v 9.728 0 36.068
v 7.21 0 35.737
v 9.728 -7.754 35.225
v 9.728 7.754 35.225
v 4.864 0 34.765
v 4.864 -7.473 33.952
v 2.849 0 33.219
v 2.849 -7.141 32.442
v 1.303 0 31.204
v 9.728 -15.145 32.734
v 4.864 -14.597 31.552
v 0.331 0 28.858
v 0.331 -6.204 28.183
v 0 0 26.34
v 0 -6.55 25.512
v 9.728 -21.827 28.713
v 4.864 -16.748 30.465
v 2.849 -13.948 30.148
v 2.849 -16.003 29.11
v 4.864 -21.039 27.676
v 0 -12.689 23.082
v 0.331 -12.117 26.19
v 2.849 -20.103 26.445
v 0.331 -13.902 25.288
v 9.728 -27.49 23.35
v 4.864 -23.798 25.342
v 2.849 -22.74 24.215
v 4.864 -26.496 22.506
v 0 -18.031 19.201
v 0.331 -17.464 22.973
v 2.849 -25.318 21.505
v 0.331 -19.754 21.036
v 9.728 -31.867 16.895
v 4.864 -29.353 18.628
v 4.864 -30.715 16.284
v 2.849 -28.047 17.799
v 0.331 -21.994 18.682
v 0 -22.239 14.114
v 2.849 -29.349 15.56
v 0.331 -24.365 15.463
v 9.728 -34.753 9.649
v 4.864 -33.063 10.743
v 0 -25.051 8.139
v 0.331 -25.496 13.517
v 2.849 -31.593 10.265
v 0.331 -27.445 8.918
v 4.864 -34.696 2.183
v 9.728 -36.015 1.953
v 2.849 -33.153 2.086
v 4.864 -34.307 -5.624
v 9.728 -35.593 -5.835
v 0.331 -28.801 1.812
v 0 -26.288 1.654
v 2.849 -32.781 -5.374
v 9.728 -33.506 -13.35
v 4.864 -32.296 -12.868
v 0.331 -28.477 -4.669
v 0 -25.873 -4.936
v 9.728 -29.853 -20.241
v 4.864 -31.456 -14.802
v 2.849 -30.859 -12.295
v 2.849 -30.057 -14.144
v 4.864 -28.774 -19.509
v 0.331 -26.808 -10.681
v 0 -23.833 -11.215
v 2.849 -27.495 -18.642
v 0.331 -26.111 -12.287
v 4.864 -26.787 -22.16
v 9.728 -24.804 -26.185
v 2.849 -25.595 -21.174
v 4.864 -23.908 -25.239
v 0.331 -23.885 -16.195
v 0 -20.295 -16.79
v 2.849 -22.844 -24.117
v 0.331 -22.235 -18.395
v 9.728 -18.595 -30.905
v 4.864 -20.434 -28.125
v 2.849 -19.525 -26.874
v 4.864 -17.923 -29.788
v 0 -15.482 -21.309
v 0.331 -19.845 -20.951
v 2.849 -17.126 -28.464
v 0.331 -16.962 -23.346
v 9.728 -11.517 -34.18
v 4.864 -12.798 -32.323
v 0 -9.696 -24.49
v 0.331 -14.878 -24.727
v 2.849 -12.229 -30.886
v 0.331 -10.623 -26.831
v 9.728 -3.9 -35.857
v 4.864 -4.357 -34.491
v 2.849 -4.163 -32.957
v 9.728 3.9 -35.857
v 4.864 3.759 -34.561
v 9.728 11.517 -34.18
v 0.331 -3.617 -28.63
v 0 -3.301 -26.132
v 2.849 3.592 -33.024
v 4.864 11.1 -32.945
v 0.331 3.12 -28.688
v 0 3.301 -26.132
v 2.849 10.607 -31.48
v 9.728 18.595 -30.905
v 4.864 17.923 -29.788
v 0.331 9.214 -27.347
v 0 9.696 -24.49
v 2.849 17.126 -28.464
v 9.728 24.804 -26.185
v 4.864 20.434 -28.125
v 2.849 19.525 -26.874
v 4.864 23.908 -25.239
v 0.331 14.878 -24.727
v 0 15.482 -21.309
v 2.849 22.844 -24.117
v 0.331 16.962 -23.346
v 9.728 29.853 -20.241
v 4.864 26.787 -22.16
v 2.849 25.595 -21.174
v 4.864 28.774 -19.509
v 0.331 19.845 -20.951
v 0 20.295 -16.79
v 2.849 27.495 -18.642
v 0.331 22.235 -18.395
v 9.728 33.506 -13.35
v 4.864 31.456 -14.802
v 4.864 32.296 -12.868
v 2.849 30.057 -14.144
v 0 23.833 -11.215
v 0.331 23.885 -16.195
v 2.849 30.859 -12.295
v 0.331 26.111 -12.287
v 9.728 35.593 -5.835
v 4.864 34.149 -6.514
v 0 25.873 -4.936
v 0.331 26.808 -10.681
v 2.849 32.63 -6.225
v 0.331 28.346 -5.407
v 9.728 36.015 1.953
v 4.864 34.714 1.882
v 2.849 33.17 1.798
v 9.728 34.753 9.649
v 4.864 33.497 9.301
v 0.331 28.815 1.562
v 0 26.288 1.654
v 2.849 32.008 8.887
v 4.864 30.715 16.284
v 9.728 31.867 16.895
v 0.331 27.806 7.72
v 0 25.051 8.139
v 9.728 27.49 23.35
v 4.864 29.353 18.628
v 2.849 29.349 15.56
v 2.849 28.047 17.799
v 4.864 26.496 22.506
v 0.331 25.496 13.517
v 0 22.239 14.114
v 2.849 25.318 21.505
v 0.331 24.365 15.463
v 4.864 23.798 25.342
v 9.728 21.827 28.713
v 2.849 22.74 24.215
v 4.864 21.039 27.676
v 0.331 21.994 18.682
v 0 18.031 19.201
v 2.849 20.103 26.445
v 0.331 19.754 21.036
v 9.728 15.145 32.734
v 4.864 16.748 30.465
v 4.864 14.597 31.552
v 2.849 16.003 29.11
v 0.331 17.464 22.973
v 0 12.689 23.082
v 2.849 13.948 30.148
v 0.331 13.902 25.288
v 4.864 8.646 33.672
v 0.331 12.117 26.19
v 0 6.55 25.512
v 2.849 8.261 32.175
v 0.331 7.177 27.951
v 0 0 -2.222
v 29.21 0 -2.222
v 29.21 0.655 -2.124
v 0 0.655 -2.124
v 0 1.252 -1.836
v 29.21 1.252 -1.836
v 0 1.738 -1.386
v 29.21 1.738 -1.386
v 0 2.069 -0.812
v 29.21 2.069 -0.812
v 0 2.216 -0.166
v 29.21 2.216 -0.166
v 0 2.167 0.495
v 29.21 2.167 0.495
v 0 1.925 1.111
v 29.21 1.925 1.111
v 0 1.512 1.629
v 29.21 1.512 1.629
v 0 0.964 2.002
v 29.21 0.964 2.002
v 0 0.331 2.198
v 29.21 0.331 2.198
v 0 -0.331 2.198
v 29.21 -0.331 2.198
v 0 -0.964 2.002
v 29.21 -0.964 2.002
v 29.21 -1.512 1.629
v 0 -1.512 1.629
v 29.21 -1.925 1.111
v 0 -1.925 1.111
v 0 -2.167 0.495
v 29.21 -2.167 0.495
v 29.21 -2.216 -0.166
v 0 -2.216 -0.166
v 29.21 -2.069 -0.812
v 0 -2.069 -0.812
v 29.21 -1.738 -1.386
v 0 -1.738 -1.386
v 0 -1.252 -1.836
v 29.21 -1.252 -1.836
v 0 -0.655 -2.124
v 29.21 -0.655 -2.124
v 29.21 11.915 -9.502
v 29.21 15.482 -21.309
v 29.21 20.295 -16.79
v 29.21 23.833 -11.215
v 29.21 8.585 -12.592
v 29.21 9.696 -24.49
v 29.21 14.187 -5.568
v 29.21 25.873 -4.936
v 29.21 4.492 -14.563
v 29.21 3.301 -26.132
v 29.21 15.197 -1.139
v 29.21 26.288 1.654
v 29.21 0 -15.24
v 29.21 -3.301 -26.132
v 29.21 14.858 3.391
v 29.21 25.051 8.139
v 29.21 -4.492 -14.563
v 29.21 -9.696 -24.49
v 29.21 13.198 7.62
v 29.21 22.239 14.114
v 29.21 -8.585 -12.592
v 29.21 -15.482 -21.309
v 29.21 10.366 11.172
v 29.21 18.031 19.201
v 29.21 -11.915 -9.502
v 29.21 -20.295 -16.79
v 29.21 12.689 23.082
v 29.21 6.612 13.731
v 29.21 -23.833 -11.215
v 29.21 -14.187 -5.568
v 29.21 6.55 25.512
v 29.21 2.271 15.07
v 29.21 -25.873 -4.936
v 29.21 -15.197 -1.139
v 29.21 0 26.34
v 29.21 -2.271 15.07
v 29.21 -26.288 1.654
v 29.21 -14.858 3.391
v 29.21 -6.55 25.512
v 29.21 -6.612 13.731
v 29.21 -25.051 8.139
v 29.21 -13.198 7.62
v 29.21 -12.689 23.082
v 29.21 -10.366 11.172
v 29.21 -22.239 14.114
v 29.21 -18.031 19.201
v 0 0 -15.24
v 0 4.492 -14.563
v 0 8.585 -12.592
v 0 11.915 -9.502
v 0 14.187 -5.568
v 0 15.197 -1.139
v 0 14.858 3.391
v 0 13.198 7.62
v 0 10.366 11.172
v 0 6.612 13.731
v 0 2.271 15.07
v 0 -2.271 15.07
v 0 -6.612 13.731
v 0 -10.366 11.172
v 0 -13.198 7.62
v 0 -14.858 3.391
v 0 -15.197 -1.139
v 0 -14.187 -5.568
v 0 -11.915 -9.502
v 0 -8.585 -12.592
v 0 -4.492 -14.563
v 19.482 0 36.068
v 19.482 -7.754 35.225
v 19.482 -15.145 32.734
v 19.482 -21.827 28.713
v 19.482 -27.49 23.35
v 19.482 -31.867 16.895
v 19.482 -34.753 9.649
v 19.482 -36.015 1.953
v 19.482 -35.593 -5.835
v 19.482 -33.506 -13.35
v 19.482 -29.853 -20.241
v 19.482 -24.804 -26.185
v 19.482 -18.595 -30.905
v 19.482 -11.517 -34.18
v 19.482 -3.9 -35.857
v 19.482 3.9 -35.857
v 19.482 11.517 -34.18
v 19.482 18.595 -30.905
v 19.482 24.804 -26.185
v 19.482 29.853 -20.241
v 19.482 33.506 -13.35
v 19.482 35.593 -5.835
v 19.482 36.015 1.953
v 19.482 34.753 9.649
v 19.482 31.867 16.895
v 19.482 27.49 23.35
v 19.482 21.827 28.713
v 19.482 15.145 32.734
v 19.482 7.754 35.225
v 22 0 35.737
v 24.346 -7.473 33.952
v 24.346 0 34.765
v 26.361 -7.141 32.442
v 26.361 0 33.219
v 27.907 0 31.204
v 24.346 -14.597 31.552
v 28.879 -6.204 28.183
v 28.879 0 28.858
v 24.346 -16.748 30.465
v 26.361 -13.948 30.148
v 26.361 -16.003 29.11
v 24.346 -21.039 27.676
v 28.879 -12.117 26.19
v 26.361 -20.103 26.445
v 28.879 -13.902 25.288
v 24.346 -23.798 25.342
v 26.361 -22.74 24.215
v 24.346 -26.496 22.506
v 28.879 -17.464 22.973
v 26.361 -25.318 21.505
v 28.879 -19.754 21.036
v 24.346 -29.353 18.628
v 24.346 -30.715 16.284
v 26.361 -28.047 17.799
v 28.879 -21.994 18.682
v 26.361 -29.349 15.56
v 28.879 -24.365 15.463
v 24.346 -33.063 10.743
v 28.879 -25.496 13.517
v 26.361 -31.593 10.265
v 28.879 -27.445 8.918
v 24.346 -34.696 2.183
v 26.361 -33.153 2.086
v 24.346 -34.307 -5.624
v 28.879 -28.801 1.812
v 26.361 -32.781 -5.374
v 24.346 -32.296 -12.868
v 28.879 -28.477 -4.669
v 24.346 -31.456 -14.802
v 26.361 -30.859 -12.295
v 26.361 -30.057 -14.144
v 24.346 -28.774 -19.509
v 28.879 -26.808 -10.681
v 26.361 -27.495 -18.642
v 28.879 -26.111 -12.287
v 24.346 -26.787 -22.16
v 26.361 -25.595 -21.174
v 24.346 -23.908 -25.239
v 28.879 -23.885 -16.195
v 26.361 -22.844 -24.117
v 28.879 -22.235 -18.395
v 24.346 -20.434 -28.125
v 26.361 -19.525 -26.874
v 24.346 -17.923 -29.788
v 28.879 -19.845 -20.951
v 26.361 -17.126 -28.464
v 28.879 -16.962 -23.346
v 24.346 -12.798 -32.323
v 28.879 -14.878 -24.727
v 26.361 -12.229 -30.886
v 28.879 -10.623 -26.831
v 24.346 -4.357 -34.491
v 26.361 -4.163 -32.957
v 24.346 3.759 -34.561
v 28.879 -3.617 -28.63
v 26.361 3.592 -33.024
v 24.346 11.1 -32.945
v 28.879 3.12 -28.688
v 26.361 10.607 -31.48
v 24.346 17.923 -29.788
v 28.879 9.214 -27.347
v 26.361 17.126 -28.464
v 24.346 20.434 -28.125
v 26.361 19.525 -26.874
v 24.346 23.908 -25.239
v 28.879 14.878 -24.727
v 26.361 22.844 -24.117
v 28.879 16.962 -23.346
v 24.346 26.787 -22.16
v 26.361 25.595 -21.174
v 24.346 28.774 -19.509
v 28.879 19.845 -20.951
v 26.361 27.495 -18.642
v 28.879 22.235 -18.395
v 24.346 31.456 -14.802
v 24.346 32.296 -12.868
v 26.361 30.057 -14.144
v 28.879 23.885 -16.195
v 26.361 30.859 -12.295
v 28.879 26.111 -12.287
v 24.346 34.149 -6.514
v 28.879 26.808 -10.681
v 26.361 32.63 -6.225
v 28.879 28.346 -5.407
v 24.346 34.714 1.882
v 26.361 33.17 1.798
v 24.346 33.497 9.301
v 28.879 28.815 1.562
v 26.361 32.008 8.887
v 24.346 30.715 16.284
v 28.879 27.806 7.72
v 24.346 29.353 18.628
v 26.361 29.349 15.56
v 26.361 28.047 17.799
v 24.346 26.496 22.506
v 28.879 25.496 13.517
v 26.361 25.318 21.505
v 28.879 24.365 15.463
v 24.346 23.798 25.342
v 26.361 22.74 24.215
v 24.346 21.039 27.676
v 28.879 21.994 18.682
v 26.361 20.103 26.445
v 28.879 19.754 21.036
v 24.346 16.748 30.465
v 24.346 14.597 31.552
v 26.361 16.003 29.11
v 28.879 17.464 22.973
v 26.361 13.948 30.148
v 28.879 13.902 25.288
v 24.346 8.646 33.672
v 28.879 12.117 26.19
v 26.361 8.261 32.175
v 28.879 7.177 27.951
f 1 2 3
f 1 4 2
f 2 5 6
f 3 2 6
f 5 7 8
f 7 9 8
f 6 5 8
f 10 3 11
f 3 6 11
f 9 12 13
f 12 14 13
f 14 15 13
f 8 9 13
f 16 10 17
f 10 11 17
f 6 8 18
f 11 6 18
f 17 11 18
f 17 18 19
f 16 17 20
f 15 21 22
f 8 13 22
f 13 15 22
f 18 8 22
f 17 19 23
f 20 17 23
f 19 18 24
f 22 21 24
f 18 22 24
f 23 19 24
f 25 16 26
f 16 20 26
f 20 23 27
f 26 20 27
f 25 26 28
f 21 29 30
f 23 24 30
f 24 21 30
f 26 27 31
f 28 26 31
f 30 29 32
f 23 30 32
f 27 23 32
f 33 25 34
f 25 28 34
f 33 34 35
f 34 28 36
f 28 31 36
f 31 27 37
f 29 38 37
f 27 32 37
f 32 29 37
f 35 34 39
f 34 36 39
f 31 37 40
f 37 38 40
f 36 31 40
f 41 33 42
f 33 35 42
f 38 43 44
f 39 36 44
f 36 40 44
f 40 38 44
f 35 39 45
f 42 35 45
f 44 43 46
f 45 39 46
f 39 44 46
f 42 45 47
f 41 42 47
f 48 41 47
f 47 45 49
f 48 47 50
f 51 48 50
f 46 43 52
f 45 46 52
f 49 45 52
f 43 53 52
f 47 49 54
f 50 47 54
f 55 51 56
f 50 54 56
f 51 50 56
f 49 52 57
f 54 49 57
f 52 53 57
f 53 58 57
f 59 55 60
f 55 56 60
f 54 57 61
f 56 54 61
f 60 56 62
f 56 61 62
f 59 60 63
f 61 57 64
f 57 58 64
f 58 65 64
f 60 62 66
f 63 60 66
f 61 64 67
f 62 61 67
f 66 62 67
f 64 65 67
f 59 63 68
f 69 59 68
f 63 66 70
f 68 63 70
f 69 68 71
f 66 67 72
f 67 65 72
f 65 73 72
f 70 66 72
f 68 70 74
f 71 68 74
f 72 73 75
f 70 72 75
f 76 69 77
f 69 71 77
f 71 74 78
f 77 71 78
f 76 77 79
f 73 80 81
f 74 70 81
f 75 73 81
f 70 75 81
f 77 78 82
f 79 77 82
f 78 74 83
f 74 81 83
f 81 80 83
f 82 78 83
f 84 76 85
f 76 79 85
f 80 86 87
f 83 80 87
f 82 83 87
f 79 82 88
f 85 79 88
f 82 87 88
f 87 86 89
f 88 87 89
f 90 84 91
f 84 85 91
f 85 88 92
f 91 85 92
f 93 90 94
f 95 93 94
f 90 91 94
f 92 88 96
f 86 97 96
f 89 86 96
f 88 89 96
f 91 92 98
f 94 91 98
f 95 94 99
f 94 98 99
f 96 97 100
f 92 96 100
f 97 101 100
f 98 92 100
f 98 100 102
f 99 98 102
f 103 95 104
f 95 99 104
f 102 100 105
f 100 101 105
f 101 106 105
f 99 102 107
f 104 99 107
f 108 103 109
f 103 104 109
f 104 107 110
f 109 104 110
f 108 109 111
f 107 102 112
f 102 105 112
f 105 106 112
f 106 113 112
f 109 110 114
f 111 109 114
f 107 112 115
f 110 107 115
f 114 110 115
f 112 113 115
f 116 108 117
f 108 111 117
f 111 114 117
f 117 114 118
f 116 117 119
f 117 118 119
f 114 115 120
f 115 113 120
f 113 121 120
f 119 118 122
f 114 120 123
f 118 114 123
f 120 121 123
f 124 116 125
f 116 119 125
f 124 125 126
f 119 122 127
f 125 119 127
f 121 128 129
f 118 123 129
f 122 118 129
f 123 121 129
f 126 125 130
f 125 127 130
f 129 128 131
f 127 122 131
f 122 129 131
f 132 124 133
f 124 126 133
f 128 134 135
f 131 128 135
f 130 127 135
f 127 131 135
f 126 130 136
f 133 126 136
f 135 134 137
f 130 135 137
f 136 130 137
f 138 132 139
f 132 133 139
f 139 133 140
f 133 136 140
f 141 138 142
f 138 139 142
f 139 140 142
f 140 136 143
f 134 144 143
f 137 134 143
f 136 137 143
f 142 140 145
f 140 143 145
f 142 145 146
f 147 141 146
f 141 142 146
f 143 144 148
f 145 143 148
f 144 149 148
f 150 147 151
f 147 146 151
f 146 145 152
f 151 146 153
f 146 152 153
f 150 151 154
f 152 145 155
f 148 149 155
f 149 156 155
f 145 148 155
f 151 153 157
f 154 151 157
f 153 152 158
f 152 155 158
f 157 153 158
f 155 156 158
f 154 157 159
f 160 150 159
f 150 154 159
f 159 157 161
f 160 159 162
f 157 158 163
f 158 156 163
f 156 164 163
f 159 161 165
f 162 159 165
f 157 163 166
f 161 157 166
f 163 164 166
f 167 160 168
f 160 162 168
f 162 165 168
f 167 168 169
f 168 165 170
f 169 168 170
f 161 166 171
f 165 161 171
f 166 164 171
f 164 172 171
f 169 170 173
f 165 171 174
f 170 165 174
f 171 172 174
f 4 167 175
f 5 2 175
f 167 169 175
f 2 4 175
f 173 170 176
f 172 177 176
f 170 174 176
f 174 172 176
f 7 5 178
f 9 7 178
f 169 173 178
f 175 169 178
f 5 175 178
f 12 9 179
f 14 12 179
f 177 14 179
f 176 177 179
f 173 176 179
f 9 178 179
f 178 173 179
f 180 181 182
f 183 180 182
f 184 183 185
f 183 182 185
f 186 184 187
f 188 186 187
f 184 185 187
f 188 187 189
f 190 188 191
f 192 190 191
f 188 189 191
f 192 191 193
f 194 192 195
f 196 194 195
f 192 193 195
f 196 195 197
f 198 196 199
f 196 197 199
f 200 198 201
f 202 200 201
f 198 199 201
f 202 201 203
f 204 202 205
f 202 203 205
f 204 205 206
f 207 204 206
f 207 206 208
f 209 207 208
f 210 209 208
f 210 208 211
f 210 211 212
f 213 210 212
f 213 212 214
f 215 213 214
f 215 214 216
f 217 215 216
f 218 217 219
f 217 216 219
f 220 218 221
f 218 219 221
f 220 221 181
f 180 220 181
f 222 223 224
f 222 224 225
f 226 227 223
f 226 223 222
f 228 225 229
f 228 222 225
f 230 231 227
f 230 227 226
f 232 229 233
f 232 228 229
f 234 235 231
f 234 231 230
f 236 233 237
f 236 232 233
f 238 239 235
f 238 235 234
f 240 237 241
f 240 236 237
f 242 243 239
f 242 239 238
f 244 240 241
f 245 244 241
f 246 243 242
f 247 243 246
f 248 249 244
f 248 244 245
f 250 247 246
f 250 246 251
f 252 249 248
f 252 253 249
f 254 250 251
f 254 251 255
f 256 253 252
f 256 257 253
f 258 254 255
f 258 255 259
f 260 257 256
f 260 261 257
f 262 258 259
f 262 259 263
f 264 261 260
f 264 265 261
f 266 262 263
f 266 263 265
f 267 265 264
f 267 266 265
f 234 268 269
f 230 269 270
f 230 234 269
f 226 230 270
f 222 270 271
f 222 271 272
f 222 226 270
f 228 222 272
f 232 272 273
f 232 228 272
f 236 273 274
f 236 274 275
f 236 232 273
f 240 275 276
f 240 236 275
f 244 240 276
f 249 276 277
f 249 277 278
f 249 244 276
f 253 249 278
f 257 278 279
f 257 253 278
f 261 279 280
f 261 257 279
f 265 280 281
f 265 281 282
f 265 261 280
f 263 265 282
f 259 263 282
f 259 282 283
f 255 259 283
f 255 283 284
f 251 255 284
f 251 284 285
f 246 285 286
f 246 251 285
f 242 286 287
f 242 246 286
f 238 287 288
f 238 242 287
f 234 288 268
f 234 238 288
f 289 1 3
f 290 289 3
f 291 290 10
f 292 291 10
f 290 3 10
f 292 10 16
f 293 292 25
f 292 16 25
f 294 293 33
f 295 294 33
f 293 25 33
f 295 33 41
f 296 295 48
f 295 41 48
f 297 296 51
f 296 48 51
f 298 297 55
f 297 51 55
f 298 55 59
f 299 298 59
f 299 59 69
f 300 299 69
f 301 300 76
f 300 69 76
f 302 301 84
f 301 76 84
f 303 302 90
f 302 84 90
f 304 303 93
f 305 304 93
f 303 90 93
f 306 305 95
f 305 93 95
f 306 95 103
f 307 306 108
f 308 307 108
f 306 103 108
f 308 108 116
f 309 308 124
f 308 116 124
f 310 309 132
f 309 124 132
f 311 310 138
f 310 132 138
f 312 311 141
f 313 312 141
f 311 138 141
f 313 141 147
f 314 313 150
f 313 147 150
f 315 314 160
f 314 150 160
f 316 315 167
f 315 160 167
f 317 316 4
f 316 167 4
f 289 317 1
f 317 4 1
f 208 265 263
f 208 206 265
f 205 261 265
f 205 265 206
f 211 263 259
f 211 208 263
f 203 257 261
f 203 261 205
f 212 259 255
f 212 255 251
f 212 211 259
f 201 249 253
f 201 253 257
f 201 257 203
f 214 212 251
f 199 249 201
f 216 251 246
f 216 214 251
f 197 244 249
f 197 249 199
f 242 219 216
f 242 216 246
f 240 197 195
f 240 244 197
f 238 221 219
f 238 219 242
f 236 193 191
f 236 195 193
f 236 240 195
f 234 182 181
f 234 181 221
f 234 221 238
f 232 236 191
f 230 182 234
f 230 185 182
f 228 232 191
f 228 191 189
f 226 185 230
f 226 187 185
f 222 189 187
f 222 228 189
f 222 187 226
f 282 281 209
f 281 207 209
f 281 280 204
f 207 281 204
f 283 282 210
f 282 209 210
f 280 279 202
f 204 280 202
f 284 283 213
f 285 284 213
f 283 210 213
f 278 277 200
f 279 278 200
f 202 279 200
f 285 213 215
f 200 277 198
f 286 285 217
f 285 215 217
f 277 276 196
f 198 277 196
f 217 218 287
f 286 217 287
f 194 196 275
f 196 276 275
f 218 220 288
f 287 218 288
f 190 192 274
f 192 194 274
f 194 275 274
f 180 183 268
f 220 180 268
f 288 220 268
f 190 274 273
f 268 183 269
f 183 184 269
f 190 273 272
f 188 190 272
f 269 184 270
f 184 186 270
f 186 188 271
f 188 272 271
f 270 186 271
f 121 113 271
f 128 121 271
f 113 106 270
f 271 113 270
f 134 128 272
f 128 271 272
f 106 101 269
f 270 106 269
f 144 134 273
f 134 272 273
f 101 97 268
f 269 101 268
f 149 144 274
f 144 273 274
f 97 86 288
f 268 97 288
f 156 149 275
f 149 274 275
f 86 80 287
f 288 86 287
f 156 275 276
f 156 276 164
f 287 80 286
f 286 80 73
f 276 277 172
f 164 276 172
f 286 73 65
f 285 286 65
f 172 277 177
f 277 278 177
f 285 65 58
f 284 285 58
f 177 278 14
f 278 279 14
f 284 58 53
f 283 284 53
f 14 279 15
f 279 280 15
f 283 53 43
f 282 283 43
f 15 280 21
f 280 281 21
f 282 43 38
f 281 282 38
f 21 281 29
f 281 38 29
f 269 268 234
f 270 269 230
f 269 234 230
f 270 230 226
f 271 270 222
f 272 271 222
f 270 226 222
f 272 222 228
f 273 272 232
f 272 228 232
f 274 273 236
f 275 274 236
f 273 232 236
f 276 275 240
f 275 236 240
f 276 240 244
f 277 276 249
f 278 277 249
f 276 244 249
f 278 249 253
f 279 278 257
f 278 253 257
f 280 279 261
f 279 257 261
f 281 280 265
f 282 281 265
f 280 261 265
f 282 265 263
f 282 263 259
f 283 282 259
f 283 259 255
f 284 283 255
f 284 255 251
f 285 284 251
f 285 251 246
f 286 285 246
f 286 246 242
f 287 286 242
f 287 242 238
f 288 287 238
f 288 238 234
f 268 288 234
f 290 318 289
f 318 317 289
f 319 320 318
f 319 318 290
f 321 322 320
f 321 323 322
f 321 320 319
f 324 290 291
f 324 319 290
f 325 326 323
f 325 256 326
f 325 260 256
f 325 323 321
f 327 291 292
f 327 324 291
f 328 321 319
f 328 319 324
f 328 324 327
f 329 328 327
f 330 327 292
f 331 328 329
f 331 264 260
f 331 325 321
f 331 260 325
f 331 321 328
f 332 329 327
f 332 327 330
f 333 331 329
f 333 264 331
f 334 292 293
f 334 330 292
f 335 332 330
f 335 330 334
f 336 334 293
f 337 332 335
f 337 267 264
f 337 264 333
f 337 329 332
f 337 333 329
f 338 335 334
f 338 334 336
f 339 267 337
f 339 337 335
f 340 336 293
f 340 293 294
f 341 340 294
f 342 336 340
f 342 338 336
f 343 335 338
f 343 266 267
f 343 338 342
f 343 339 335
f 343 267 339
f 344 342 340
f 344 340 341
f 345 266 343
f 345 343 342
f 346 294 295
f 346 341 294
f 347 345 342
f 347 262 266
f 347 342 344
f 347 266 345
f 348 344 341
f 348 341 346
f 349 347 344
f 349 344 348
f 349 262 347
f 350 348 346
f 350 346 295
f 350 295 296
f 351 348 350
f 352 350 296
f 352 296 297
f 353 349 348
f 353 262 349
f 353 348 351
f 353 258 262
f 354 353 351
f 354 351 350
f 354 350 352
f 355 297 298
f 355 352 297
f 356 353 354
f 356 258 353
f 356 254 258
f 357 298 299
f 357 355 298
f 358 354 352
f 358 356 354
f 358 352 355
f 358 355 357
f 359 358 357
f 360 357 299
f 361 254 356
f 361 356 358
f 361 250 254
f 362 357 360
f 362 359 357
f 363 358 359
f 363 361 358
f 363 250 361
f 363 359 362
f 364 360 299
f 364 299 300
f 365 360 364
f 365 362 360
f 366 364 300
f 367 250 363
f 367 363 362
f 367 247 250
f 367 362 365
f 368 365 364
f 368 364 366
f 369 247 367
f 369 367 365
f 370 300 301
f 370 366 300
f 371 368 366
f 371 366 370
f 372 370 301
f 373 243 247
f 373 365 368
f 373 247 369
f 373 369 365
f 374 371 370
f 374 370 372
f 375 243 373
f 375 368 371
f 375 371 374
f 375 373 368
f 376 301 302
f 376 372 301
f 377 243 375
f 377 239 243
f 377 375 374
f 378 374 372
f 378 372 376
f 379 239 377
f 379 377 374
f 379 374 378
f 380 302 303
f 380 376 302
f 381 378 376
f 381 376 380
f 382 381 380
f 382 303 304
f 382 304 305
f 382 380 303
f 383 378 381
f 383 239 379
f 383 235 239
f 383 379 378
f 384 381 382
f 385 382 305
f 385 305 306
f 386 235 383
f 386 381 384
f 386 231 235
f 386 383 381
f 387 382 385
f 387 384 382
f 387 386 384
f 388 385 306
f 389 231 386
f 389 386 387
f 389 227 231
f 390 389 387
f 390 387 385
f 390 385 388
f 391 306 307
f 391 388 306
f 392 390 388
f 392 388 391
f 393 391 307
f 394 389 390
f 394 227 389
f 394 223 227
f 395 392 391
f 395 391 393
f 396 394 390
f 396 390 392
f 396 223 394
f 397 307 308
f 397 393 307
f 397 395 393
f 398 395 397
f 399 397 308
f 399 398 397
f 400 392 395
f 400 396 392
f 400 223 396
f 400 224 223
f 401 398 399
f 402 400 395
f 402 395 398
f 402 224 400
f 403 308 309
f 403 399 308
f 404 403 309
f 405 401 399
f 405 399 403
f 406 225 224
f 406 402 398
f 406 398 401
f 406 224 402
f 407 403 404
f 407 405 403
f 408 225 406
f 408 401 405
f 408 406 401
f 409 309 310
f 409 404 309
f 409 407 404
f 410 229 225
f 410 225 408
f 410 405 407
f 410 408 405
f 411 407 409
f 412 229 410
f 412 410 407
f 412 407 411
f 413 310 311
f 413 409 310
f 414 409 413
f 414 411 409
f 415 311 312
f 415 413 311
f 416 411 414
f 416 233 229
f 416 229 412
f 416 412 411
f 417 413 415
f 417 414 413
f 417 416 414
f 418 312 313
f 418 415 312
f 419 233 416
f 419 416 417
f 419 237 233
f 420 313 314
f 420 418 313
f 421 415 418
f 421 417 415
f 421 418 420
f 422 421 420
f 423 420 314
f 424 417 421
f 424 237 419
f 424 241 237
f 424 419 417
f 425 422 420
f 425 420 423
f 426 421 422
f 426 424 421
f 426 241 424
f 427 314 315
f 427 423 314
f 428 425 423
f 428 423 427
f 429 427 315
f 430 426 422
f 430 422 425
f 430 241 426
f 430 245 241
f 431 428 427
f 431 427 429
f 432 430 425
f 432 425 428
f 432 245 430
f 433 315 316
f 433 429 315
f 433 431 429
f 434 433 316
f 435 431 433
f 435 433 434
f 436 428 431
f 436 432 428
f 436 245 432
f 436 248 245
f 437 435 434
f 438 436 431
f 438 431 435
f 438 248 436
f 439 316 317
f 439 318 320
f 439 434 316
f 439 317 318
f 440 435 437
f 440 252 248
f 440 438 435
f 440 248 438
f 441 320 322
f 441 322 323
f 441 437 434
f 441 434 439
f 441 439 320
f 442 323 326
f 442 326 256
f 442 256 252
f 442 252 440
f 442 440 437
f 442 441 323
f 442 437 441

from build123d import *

# Parameters (mm, degrees)
SKETCH1_R           = 36.068
BOSS_EXTRUDE1_DEPTH = 29.21
FILLET1_R           = 9.7282
FILLET2_R           = 9.7282
SKETCH2_R           = 15.24
CUT_EXTRUDE1_DEPTH  = 59.779463659
SKETCH3_R           = 15.24
BOSS_EXTRUDE2_DEPTH = 29.21
SKETCH4_R           = 2.2225
CUT_EXTRUDE2_DEPTH  = 29.21


with BuildPart() as part:
    # Sketch1 → Boss-Extrude1 (new body)
    with BuildSketch(Plane(origin=(0, 0, 0), x_dir=(0, 0, -1), z_dir=(1, 0, 0))):
        with Locations(Location((0, 0, 0), (0, 0, 180))):
            Circle(SKETCH1_R)
    extrude(amount=BOSS_EXTRUDE1_DEPTH)

    # Fillet1
    fillet1_edges = [part.edges().sort_by_distance(p)[0] for p in [
        (29.21, 0, -36.068),
    ]]
    fillet(fillet1_edges, radius=FILLET1_R)

    # Fillet2
    fillet2_edges = [part.edges().sort_by_distance(p)[0] for p in [
        (0, 0, -36.068),
    ]]
    fillet(fillet2_edges, radius=FILLET2_R)

    # Sketch2 → Cut-Extrude1 (cut, through all)
    with BuildSketch(Plane(origin=(29.21, 0, 0), x_dir=(0, 0, -1), z_dir=(1, 0, 0))):
        Circle(SKETCH2_R)
    extrude(amount=-CUT_EXTRUDE1_DEPTH, mode=Mode.SUBTRACT)


with BuildPart() as body_2:
    # Sketch3 → Boss-Extrude2 (new body)
    with BuildSketch(Plane(origin=(29.21, 0, 0), x_dir=(0, 0, -1), z_dir=(1, 0, 0))):
        Circle(SKETCH3_R)
    extrude(amount=-BOSS_EXTRUDE2_DEPTH)

    # Sketch4 → Cut-Extrude2 (cut)
    with BuildSketch(Plane(origin=(29.21, 0, 0), x_dir=(0, 0, -1), z_dir=(1, 0, 0))):
        Circle(SKETCH4_R)
    extrude(amount=-CUT_EXTRUDE2_DEPTH, mode=Mode.SUBTRACT)


solid = Compound([part.part, body_2.part])
